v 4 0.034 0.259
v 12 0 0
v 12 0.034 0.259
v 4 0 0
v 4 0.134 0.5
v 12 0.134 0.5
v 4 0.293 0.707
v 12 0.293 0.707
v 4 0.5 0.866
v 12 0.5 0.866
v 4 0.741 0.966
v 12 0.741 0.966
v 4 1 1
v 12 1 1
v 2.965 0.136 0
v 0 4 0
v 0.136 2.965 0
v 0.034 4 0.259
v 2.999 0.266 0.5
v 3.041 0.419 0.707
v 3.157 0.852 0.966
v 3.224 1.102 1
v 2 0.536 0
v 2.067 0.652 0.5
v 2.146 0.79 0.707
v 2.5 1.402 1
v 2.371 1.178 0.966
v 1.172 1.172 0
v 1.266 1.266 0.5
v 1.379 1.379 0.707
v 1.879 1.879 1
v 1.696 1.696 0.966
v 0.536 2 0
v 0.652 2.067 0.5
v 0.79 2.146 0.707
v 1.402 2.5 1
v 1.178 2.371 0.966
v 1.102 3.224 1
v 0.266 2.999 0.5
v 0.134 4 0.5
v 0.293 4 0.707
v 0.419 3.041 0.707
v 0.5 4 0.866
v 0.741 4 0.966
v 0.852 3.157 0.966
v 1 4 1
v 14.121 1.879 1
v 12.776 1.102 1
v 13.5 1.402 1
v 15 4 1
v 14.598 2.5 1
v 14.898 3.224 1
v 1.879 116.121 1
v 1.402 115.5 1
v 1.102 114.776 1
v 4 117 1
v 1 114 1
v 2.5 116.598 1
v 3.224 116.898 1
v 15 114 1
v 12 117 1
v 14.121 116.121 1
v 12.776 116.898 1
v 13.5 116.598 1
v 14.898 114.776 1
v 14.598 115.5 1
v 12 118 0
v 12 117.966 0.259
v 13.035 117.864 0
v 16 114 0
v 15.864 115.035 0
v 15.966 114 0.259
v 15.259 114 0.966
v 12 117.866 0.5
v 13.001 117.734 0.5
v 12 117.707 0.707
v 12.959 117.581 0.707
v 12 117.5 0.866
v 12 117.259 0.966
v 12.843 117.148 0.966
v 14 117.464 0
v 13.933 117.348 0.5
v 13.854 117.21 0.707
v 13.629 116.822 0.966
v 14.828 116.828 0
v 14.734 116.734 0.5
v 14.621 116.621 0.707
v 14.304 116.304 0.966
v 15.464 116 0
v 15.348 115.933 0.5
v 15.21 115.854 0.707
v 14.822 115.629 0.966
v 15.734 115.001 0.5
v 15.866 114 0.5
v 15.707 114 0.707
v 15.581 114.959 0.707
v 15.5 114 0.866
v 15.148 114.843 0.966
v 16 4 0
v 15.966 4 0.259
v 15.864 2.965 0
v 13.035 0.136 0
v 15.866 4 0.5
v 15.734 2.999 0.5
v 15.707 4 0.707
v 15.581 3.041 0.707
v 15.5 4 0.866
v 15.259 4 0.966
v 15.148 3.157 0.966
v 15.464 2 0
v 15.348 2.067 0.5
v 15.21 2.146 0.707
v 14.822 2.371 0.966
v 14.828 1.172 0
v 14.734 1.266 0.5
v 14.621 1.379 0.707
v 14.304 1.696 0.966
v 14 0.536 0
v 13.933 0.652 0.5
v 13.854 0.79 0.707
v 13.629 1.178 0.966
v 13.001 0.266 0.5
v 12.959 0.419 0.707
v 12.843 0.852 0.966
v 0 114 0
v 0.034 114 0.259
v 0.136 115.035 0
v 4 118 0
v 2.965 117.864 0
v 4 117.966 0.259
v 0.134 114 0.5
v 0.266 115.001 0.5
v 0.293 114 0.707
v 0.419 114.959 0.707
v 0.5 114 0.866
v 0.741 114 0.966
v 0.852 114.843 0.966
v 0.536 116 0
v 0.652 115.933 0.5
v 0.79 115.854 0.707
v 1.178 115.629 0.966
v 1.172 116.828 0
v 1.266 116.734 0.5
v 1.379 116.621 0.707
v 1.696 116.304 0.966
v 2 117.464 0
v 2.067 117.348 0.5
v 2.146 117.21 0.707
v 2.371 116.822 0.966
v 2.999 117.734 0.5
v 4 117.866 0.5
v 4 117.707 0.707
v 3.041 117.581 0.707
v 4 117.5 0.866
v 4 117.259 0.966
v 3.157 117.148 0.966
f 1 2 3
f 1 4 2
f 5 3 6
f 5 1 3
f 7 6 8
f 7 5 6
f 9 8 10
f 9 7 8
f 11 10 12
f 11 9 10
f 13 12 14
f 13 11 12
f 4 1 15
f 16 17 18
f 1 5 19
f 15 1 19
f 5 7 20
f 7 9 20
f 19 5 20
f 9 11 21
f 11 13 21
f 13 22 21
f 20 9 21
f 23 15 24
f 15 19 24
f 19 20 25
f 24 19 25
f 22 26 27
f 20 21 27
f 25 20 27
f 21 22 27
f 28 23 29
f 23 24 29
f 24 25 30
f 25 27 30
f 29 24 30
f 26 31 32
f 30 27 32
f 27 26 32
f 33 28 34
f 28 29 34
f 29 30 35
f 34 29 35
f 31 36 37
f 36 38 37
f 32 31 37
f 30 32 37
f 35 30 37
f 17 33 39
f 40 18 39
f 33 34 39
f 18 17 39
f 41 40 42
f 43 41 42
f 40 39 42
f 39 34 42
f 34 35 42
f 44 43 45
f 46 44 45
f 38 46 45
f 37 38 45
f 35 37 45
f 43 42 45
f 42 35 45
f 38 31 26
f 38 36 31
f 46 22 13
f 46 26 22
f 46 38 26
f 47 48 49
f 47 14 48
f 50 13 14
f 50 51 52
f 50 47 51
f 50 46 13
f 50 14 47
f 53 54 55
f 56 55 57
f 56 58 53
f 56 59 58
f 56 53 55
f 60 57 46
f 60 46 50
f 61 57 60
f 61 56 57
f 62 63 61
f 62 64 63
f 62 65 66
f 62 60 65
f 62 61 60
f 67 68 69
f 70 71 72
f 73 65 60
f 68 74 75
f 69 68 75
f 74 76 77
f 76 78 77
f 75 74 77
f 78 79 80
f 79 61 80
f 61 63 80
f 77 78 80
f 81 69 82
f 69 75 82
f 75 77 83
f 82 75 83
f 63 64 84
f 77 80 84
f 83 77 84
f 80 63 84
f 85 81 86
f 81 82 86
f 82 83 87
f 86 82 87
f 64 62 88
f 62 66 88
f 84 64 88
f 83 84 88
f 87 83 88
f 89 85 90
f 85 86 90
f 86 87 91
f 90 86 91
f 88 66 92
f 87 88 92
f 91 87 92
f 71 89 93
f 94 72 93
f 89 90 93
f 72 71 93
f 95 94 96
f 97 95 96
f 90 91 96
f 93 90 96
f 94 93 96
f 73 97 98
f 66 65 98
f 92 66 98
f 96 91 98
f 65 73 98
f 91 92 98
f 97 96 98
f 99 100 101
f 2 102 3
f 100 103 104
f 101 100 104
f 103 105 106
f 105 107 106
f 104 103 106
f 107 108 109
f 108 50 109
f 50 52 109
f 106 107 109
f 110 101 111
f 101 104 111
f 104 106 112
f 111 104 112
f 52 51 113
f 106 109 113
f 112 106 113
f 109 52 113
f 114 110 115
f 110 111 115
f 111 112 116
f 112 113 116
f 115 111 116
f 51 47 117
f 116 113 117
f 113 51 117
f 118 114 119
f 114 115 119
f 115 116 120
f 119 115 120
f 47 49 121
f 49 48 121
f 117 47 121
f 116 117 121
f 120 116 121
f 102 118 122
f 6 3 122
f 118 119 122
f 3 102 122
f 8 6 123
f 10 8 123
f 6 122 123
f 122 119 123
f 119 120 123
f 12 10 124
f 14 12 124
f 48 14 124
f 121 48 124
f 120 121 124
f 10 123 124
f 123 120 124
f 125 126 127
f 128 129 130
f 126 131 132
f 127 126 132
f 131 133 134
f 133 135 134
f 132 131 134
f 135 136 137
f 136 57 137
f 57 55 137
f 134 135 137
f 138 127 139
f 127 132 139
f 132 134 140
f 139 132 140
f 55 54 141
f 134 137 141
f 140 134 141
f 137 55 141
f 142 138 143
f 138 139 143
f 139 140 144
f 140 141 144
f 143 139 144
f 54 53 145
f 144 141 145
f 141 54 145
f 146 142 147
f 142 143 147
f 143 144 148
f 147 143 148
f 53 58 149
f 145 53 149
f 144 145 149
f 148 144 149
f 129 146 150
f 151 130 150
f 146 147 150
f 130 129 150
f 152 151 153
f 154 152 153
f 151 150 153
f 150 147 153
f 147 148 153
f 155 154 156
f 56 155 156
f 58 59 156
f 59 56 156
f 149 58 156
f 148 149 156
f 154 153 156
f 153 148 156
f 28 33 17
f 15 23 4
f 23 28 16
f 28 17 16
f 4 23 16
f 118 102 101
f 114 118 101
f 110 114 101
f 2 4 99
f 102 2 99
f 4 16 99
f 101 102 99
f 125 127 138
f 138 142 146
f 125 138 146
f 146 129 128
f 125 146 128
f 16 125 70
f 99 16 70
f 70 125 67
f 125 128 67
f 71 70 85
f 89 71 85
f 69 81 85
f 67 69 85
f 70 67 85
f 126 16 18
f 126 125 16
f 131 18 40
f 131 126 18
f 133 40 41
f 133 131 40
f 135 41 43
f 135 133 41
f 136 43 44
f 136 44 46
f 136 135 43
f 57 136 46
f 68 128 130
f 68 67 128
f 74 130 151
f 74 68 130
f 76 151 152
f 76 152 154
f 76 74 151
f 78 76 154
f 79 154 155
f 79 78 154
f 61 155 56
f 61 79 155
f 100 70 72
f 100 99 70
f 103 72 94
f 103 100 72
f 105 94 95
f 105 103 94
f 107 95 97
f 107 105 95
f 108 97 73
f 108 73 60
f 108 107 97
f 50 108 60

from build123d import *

# Parameters (mm, degrees)
SKETCH_1_W      = 16
SKETCH_1_H      = 118
EXTRUDE_1_DEPTH = 1
FILLET_1_R      = 4
FILLET_2_R      = 1


with BuildPart() as part:
    # Эскиз1 → Бобышка-Вытянуть1 (new body)
    with BuildSketch(Plane.XY):
        with Locations((8, 59)):
            Rectangle(SKETCH_1_W, SKETCH_1_H)
    extrude(amount=EXTRUDE_1_DEPTH)

    # Скругление1
    fillet_1_edges = [part.edges().sort_by_distance(p)[0] for p in [
        (0, 118, 0.5),
        (16, 118, 0.5),
        (16, 0, 0.5),
        (0, 0, 0.5),
    ]]
    fillet(fillet_1_edges, radius=FILLET_1_R)

    # Скругление2
    fillet_2_edges = [part.edges().sort_by_distance(p)[0] for p in [
        (1.171572875, 116.828427125, 1),
        (8, 118, 1),
        (14.828427125, 116.828427125, 1),
        (16, 59, 1),
        (14.828427125, 1.171572875, 1),
        (8, 0, 1),
        (1.171572875, 1.171572875, 1),
        (0, 59, 1),
    ]]
    fillet(fillet_2_edges, radius=FILLET_2_R - 0.0001)  # a hair under: the kernel refuses the full size


solid = part.part
